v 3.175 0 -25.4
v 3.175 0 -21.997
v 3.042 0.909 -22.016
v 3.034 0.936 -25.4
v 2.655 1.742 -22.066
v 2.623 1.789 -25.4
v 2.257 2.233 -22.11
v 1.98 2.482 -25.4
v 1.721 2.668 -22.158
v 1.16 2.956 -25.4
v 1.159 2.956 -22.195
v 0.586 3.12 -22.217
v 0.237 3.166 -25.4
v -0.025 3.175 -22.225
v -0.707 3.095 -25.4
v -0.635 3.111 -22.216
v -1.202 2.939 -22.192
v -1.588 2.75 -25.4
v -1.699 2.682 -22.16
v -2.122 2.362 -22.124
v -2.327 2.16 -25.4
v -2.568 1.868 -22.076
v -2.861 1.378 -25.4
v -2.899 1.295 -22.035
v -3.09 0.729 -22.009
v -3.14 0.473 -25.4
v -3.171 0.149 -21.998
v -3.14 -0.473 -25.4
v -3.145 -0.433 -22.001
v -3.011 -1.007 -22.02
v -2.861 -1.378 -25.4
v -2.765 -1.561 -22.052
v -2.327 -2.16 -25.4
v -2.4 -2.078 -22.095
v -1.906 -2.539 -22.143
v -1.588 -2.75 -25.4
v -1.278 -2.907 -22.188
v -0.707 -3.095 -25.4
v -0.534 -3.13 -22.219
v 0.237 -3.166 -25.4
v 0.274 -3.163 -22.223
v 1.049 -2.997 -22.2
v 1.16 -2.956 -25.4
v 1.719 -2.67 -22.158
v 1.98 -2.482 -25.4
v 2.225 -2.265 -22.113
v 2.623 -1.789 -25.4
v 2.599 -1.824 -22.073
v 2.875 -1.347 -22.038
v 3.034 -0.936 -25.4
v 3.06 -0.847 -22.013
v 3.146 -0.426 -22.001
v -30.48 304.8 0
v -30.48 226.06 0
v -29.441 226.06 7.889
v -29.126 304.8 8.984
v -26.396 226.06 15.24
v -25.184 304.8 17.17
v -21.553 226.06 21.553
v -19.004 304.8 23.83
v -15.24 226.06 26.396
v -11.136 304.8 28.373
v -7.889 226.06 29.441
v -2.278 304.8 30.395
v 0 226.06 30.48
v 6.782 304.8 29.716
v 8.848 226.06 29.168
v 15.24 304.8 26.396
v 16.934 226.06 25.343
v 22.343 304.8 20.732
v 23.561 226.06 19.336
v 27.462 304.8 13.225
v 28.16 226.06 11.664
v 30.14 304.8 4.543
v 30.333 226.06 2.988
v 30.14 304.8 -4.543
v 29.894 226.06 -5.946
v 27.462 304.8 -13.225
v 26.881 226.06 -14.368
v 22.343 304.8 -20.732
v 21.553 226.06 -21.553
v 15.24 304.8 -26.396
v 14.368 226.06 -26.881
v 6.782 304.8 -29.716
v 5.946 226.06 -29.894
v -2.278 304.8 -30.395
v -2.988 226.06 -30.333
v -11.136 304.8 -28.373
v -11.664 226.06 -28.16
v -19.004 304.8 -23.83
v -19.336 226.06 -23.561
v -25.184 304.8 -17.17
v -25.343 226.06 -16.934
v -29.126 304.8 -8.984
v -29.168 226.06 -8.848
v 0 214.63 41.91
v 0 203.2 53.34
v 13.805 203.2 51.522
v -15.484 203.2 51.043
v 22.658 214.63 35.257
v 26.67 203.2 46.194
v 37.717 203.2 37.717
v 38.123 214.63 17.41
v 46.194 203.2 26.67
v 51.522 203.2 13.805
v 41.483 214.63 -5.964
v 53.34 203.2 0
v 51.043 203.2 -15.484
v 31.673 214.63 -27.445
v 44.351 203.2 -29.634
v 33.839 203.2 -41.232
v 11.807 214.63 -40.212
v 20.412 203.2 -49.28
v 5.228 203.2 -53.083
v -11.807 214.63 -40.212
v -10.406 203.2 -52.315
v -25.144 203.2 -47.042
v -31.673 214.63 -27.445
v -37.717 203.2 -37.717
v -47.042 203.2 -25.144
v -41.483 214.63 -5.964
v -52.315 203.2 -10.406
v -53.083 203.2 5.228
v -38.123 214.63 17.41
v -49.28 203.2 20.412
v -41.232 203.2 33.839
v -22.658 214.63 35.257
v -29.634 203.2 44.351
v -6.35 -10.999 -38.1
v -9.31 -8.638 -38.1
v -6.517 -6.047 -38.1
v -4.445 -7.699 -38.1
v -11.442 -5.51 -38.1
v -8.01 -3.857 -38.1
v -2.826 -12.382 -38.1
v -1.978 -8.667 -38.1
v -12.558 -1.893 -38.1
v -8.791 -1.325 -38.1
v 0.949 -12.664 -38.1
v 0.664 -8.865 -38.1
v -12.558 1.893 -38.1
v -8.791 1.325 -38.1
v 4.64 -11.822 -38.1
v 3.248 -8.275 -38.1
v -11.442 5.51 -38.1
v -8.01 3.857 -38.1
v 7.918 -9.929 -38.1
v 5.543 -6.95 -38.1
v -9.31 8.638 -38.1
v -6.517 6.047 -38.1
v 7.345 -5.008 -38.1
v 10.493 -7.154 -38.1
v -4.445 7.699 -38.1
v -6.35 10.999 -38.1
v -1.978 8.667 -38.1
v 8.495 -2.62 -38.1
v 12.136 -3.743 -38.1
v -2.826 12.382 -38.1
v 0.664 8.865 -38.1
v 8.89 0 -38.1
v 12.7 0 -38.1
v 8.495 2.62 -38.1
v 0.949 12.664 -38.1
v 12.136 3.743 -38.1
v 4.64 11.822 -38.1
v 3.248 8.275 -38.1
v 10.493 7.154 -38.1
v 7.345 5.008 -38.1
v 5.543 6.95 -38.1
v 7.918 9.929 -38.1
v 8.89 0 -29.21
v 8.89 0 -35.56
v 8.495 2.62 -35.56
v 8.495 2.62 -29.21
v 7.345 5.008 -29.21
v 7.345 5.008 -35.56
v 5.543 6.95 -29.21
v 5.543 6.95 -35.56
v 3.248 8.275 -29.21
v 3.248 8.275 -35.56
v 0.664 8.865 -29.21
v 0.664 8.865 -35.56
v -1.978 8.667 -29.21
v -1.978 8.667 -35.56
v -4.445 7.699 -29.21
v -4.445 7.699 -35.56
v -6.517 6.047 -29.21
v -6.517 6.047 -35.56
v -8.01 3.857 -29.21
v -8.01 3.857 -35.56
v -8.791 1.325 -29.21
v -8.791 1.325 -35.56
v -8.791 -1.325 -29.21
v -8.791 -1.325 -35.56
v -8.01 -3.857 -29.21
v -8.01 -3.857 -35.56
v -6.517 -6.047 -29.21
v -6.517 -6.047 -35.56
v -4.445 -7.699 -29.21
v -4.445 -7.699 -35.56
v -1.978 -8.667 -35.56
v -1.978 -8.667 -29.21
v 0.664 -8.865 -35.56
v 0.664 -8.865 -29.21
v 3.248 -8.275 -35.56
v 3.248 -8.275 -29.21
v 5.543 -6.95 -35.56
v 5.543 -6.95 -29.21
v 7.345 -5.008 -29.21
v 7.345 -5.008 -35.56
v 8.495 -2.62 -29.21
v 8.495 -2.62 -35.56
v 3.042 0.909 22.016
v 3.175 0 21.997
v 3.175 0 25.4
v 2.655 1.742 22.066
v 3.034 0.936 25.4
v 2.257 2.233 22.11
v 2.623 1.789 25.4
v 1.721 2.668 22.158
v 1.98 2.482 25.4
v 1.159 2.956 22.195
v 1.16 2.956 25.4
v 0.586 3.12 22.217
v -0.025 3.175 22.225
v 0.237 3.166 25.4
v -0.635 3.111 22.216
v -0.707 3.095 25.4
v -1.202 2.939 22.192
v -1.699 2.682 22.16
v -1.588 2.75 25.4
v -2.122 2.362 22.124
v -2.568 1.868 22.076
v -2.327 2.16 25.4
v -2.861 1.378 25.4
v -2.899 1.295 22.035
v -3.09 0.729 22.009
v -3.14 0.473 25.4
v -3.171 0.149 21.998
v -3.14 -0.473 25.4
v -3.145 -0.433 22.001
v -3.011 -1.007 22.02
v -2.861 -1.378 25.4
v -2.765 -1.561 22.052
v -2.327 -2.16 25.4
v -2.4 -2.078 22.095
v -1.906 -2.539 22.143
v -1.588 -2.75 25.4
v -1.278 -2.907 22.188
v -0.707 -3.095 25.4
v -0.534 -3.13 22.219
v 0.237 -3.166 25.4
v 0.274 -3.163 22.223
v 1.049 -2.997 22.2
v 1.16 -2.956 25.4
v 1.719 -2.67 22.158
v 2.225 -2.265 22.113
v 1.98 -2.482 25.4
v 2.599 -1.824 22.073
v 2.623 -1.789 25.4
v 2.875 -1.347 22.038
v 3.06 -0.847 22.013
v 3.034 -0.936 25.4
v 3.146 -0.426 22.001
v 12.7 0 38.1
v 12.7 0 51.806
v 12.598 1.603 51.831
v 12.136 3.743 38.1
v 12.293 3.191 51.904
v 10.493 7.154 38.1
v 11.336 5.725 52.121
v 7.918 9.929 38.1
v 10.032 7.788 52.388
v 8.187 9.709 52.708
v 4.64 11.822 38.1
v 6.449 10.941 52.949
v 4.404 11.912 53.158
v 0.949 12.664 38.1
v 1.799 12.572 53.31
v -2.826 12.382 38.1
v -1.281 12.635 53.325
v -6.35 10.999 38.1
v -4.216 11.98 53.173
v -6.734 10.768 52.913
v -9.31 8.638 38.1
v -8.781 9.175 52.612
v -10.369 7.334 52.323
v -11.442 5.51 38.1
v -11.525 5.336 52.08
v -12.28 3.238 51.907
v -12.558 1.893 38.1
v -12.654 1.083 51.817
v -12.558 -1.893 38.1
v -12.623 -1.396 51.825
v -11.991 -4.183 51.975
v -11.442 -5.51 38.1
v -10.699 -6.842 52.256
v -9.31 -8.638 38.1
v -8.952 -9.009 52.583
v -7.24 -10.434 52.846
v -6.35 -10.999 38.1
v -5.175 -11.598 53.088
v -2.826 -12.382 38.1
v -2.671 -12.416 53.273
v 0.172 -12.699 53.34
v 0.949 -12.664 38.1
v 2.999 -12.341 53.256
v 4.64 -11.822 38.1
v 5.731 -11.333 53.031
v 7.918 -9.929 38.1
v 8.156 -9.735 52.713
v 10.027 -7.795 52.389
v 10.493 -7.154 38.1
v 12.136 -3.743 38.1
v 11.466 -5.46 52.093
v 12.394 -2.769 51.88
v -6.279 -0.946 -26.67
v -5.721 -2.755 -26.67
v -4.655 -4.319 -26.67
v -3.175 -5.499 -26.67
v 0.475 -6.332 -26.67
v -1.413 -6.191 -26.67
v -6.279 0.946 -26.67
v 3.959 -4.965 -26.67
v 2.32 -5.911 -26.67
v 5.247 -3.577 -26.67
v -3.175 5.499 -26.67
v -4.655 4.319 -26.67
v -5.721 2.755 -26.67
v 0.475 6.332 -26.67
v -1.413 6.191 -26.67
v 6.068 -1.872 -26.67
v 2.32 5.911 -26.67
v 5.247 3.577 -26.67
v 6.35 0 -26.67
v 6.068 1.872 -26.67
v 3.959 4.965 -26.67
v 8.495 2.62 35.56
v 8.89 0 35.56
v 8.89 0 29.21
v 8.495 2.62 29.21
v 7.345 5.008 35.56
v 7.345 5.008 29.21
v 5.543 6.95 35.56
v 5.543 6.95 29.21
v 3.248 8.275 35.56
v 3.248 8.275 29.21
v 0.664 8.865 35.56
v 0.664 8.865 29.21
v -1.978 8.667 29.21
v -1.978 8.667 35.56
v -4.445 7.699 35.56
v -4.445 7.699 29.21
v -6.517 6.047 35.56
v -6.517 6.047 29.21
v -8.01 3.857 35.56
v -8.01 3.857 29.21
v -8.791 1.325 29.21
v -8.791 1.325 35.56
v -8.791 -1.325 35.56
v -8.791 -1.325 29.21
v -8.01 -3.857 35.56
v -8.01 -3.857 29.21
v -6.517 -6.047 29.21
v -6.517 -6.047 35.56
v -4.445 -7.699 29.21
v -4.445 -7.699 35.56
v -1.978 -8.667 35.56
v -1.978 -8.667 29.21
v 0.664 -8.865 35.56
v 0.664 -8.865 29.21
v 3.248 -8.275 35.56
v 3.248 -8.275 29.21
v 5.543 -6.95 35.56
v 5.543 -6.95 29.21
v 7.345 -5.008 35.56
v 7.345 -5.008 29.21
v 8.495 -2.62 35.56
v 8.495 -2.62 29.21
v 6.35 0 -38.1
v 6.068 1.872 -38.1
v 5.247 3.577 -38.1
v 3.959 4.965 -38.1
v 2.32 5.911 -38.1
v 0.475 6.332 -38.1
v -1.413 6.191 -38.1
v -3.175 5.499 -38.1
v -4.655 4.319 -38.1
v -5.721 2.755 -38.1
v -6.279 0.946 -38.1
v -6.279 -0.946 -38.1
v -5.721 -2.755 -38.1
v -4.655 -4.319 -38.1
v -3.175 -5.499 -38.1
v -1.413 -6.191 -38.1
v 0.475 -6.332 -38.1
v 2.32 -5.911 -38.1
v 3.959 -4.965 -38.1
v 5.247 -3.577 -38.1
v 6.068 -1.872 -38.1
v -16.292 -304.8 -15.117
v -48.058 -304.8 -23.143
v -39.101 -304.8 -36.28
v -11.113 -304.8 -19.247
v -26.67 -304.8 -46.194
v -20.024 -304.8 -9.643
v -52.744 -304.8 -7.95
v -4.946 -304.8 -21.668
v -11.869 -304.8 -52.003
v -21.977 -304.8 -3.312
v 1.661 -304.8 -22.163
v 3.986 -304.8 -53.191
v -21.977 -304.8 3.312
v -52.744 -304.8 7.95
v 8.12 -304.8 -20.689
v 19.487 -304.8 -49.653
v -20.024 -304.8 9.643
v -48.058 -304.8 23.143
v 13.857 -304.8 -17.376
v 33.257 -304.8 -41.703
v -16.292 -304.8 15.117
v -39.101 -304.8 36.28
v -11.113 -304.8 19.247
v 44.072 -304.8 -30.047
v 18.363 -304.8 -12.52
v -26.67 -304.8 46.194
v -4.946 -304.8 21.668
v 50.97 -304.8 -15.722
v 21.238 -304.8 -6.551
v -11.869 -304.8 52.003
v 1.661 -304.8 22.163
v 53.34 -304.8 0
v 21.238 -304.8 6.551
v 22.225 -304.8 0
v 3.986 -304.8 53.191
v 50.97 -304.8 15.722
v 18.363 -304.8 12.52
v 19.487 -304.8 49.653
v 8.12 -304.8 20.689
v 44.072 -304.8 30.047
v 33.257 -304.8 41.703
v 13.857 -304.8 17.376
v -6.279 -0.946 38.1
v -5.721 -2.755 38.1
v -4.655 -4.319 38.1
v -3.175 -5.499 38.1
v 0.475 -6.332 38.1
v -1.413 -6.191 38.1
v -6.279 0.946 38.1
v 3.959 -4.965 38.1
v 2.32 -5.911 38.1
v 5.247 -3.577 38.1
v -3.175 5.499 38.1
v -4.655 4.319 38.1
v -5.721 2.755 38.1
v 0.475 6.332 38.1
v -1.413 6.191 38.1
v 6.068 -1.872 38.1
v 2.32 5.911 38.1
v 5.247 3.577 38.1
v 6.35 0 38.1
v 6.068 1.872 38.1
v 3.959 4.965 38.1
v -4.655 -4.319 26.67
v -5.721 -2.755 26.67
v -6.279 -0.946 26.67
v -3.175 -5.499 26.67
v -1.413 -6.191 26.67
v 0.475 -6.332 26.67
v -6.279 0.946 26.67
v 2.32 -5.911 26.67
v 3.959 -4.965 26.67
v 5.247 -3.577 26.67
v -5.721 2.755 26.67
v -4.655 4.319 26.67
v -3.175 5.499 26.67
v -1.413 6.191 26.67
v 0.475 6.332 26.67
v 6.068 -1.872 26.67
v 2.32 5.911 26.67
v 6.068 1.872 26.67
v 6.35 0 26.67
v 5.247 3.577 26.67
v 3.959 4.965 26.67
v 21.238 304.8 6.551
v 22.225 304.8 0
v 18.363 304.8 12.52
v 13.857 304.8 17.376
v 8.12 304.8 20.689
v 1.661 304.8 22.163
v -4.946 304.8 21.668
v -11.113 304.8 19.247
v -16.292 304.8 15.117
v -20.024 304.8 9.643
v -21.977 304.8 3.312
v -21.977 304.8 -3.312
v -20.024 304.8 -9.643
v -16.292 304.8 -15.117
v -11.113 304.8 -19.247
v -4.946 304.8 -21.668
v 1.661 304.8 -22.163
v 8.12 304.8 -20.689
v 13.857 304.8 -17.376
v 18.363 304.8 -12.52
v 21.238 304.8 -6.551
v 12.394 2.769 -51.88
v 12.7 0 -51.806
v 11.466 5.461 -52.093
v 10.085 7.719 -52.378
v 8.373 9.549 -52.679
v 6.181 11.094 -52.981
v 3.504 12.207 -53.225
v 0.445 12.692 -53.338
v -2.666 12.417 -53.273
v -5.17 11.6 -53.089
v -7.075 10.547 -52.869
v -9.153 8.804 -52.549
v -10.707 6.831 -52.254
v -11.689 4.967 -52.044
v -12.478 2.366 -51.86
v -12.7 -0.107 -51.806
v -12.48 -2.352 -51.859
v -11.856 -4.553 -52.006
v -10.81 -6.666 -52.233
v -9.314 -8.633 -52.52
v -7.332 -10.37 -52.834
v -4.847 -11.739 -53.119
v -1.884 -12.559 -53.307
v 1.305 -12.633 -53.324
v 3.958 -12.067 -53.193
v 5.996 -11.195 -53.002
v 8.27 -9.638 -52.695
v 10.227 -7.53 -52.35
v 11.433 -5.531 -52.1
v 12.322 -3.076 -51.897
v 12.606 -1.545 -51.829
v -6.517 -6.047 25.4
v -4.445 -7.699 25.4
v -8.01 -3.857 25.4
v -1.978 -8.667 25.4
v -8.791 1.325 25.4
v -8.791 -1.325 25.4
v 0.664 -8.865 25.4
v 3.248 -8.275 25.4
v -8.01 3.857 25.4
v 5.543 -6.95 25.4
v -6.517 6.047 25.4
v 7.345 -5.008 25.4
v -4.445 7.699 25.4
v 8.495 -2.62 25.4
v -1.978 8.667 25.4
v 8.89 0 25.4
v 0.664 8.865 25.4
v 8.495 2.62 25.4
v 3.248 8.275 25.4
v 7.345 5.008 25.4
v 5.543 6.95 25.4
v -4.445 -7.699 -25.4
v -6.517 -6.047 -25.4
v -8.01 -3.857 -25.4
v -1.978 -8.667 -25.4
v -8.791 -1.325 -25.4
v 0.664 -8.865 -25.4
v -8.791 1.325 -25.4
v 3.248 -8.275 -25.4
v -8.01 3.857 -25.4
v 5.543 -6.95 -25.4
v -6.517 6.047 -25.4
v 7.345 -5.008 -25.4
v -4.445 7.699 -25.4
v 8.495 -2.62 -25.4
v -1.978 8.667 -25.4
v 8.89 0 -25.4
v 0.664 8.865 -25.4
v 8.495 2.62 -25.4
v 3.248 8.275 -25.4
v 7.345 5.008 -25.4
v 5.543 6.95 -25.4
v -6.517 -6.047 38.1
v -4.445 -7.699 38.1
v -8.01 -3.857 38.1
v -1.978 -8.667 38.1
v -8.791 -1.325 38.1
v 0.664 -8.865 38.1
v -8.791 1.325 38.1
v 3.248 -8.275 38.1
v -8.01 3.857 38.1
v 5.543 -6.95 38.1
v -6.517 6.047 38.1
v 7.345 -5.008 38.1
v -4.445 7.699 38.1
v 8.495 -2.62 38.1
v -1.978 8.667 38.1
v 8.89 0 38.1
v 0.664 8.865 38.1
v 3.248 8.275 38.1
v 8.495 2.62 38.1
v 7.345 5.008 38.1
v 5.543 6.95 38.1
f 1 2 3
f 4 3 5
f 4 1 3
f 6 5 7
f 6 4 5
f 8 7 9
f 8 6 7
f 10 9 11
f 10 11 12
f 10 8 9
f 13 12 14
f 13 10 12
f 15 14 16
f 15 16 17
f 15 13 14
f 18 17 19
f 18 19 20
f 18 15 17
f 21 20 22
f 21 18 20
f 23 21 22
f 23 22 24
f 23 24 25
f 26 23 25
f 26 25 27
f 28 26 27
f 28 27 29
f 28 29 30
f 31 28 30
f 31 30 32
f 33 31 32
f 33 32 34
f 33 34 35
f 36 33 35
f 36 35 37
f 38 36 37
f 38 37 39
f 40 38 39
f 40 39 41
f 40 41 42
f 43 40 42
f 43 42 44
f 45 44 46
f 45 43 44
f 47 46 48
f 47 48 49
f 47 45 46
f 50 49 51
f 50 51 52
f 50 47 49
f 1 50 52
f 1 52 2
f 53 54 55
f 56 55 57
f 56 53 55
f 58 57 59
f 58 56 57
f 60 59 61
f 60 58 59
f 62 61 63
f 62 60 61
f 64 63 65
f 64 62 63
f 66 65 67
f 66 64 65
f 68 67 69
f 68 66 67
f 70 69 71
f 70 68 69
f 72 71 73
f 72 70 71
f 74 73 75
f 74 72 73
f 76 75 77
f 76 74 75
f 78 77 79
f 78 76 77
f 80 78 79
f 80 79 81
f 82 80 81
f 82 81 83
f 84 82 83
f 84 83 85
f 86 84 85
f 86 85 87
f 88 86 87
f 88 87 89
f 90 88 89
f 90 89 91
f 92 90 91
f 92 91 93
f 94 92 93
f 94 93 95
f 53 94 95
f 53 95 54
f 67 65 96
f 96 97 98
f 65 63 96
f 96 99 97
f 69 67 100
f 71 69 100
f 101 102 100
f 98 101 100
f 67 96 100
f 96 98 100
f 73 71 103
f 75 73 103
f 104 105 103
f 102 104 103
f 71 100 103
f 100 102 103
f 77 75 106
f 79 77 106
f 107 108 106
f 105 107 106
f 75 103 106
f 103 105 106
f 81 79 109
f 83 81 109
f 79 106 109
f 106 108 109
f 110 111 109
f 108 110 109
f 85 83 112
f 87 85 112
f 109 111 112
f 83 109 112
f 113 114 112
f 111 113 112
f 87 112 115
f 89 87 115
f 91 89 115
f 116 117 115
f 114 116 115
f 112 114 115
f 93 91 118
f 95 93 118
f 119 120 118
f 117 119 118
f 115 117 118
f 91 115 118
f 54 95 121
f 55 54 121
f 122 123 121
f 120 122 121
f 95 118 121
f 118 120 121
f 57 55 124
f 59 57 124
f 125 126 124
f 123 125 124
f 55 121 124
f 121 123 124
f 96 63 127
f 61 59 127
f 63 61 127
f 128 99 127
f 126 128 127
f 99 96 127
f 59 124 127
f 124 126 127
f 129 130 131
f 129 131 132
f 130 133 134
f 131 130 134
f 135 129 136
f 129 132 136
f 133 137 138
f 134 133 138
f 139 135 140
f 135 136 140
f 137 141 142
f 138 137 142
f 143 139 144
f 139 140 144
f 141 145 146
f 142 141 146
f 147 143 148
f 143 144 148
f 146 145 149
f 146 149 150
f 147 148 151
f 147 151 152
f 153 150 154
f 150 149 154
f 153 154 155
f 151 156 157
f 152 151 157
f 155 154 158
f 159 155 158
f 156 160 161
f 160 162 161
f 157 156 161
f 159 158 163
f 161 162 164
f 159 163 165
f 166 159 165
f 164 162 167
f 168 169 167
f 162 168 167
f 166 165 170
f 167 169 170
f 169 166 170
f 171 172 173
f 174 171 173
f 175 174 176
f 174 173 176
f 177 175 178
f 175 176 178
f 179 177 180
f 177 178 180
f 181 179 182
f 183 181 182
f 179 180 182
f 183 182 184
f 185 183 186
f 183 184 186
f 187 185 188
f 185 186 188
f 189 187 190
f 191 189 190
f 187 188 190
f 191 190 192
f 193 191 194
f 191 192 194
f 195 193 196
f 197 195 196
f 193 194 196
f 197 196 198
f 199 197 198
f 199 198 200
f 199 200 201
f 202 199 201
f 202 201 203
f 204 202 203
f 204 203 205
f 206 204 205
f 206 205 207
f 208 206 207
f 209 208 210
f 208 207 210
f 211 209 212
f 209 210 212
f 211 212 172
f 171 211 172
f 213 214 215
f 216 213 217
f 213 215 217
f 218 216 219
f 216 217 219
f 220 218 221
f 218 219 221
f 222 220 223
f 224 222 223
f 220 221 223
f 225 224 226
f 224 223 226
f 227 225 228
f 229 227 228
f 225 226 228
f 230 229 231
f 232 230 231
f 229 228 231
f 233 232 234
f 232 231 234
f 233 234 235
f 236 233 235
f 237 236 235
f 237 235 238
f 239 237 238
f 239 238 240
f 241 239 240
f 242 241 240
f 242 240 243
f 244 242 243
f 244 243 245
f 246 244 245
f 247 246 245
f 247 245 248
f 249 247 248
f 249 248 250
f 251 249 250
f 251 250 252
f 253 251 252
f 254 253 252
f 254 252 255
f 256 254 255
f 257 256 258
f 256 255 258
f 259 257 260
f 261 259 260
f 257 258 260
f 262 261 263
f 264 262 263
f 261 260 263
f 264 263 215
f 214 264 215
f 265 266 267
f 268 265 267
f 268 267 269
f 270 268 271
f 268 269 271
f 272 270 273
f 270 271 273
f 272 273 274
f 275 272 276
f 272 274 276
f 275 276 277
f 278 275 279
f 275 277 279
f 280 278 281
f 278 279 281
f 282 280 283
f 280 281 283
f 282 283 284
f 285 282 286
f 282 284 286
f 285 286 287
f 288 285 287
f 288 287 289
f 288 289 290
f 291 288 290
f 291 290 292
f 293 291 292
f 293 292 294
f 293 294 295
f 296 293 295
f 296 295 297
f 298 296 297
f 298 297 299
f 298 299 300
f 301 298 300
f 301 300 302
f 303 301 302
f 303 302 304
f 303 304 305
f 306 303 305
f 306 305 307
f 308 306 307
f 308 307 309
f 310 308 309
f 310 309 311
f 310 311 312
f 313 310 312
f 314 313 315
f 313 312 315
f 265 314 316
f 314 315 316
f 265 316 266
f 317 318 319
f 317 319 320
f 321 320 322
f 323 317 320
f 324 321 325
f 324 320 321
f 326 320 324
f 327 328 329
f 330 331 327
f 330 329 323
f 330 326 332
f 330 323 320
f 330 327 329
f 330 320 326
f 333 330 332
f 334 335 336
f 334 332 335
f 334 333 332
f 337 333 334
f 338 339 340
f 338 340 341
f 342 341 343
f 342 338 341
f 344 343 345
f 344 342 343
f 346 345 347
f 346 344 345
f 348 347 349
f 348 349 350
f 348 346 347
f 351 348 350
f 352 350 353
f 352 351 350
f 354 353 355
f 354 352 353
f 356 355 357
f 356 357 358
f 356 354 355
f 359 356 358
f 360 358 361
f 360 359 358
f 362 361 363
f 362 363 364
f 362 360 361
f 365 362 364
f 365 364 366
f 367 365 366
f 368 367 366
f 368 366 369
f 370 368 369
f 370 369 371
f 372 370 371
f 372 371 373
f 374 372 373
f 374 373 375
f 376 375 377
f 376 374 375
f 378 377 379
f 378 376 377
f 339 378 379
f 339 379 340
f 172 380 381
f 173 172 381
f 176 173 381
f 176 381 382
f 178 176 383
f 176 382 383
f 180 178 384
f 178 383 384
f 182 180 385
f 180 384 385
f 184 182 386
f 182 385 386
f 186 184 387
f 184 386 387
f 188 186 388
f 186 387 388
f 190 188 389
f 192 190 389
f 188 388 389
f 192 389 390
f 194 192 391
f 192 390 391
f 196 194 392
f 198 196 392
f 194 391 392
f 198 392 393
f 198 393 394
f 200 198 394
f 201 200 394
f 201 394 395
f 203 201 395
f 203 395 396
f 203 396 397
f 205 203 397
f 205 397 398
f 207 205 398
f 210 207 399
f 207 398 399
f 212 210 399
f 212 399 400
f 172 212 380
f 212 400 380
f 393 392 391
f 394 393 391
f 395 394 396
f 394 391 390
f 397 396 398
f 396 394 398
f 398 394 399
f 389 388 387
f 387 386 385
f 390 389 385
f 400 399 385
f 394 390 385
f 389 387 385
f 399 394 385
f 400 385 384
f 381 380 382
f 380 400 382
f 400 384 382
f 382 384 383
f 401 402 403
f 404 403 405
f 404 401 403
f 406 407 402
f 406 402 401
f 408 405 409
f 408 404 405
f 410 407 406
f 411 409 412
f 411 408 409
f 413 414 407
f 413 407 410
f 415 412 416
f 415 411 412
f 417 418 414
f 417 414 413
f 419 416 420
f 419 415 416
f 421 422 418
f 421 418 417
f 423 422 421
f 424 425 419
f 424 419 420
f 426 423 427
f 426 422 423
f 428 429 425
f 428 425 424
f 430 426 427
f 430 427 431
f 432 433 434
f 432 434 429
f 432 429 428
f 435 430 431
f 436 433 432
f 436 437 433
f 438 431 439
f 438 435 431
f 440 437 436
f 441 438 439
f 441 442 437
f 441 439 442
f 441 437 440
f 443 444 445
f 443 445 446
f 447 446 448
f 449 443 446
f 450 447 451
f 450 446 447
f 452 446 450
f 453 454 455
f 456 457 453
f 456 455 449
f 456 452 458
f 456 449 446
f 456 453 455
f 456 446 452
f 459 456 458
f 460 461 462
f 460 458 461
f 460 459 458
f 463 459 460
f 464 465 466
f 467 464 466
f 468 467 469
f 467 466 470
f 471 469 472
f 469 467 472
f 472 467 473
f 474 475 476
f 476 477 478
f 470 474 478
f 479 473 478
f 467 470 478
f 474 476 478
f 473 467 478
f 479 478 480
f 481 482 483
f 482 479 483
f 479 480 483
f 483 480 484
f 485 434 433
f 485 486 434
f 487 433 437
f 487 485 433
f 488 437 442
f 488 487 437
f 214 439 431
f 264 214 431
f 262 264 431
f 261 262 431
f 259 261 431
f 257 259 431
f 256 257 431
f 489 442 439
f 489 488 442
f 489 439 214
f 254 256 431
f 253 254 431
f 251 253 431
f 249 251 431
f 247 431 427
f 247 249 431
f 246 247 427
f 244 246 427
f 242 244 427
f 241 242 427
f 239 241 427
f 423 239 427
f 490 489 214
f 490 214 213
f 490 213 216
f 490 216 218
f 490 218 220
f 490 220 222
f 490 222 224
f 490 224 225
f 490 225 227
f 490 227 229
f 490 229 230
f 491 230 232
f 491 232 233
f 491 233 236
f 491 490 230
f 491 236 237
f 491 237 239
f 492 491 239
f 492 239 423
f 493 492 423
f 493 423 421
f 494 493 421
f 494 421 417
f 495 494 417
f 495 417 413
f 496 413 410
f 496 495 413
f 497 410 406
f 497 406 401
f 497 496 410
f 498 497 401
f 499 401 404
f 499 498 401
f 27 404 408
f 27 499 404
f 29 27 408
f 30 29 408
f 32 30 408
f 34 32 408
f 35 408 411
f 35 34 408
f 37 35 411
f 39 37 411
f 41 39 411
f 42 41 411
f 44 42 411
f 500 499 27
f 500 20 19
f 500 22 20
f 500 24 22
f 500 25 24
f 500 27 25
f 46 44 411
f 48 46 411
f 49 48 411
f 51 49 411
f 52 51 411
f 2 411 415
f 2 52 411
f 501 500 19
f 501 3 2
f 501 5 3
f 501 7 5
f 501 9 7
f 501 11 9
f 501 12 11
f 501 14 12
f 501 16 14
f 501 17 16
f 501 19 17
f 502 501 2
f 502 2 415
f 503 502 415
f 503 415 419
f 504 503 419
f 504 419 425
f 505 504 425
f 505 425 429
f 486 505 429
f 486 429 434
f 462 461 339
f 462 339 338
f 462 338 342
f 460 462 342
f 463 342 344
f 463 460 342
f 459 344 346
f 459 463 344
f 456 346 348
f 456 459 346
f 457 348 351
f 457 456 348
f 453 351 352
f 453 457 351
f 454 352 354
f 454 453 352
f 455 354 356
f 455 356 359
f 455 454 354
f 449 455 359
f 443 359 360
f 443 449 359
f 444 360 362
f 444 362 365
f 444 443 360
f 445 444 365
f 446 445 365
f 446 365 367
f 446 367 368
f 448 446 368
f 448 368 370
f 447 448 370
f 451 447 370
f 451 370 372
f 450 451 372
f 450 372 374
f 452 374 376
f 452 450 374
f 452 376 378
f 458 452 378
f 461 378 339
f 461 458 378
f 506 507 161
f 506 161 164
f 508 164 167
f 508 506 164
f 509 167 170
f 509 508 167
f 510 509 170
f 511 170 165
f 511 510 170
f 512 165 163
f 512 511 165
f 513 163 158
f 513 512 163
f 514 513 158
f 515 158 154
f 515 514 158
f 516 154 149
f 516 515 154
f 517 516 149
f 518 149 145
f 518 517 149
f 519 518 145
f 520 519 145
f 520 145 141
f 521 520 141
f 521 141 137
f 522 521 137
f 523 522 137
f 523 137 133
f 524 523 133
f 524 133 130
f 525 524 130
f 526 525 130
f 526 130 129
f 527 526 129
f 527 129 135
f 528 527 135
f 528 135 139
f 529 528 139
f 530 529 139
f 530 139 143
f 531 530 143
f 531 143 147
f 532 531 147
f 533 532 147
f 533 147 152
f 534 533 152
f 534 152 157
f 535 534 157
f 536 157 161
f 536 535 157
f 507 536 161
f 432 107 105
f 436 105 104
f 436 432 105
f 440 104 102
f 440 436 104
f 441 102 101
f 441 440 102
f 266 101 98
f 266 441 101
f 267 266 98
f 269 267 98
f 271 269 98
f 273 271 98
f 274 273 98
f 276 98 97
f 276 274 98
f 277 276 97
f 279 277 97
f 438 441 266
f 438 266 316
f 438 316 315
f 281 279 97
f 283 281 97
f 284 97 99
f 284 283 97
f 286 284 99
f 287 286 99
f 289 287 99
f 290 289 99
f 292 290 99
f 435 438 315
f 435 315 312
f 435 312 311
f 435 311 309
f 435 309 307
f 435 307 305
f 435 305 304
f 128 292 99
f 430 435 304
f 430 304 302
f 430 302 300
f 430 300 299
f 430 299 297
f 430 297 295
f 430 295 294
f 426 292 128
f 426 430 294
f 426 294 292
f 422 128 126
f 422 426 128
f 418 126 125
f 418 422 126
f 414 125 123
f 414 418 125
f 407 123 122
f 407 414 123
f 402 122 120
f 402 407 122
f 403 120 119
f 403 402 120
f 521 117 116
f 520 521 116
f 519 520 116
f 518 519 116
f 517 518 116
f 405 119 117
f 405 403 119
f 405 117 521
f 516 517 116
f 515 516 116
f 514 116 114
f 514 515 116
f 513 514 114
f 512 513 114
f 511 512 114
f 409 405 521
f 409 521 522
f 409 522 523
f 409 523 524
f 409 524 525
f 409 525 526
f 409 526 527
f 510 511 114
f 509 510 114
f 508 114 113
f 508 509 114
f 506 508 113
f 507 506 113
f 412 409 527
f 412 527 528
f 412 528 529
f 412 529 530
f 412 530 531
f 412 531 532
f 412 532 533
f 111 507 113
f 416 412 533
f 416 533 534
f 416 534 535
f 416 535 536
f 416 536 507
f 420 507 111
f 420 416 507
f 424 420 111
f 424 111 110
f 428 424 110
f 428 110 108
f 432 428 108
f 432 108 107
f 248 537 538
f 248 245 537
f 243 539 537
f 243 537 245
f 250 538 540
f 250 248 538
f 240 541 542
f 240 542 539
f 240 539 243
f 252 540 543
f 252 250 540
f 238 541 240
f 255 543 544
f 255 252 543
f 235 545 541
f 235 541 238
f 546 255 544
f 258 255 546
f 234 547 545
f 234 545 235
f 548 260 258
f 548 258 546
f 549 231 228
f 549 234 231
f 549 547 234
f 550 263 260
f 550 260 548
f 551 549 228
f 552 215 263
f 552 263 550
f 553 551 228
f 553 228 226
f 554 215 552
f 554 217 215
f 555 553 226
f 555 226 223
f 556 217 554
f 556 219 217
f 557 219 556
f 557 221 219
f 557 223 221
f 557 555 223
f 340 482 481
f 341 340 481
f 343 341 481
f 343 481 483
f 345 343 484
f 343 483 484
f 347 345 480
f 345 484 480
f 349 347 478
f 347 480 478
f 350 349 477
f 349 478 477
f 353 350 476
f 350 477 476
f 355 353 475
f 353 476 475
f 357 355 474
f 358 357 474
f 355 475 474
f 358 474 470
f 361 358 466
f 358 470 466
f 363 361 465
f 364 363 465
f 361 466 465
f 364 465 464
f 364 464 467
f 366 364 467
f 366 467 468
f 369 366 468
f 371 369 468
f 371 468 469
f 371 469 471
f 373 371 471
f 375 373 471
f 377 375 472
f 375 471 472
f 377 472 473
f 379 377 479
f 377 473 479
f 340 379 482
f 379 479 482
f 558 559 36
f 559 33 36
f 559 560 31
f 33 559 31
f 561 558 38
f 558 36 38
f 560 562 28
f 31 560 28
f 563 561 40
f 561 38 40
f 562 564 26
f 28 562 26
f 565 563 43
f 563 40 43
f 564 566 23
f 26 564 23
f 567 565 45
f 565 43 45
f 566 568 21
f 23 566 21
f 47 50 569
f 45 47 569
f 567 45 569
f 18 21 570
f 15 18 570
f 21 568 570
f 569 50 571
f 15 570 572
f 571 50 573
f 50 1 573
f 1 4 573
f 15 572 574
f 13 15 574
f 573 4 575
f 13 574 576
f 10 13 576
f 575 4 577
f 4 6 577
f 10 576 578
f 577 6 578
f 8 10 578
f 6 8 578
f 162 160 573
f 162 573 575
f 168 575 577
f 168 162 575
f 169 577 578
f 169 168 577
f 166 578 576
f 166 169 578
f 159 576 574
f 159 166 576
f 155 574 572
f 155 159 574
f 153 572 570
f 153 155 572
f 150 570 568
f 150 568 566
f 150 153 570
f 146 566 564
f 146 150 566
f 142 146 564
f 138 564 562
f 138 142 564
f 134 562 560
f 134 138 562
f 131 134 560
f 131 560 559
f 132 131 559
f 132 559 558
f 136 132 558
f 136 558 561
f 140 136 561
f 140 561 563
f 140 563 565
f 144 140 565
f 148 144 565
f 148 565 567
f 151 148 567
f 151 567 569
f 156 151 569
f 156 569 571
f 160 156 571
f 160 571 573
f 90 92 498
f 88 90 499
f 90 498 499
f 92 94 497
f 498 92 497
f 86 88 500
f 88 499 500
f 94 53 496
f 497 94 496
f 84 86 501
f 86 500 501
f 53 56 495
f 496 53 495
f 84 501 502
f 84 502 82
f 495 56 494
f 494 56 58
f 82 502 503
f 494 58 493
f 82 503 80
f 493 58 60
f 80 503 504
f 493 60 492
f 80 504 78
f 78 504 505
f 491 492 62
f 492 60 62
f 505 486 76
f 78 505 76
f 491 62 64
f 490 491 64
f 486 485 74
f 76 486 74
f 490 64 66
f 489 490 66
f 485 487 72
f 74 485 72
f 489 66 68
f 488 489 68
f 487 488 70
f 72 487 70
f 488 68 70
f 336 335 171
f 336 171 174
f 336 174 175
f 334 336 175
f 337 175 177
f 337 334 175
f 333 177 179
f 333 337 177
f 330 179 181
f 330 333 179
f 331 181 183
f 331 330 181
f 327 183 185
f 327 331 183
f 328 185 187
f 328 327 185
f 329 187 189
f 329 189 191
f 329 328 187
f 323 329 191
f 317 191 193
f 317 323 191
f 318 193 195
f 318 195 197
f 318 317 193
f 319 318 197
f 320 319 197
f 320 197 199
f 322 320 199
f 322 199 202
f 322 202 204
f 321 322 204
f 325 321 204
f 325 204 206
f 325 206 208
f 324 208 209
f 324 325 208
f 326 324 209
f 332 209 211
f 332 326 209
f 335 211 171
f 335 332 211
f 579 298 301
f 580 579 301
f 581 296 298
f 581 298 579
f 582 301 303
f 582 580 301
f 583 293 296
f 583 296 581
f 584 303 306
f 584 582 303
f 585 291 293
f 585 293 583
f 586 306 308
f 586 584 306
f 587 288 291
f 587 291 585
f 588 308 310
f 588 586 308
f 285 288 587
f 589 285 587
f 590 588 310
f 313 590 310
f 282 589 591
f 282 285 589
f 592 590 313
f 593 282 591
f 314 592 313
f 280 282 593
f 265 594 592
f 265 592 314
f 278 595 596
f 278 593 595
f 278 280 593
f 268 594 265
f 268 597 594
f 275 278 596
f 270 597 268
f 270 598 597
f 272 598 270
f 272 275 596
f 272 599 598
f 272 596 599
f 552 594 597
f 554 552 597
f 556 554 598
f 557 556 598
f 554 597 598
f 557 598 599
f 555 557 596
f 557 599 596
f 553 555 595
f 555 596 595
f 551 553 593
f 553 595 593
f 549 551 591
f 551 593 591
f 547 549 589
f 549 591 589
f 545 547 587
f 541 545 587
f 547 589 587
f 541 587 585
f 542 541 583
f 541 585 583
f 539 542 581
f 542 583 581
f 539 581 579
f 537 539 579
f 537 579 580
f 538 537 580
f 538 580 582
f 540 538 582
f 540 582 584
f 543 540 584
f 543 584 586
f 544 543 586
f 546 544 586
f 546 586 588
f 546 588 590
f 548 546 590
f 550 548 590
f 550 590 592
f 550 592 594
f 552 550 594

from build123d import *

# Parameters (mm, degrees)
F0_R      = 53.34
F0_R_2    = 22.225
F1_DEPTH  = 304.8
F4_R      = 53.34
F4_R_2    = 30.48
F5_DEPTH  = 101.6
F10_R     = 12.7
F10_R_2   = 8.89
F10_R_3   = 3.175
F11_DEPTH = 15.24
F12_DEPTH = 27.94
F13_DEPTH = 32.3429548439
F14_R     = 12.7
F14_R_2   = 8.89
F14_R_3   = 3.175
F15_DEPTH = 15.24
F16_DEPTH = 27.94
F17_DEPTH = 32.3429548439
F20_R     = 8.89
F21_DEPTH = 11.43
F22_SIZE  = 2.54
F23_R     = 8.89
F24_DEPTH = 11.43
F25_SIZE  = 2.54


with BuildPart() as f1:
    # F0 (on Front) → F1 (new body, symmetric)
    with BuildSketch(Plane.XZ):
        Circle(F0_R)
        Circle(F0_R_2, mode=Mode.SUBTRACT)
    extrude(amount=F1_DEPTH, both=True)

    # F4 (on offset) → F5 (cut)
    with BuildSketch(Plane(origin=(0, 304.8, 0), x_dir=(-1, 0, 0), z_dir=(0, 1, 0))):
        Circle(F4_R)
        Circle(F4_R_2, mode=Mode.SUBTRACT)
    extrude(amount=-F5_DEPTH, mode=Mode.SUBTRACT)

    # F6 (on Right) → F7 (revolve)
    with BuildSketch(Plane.YZ):
        Polygon((203.2, 53.34), (203.2, 30.48), (226.06, 30.48), align=None)
    revolve(axis=Axis((0, 101.6, 0), (0, 1, 0)))

    # F10 (on offset) → F11 (cut)
    with BuildSketch(Plane.XY.offset(53.34)):
        Circle(F10_R)
        Circle(F10_R_2, mode=Mode.SUBTRACT)
        Circle(F10_R_2)
        Circle(F10_R_3, mode=Mode.SUBTRACT)
        Circle(F10_R_3)
    extrude(amount=-F11_DEPTH, mode=Mode.SUBTRACT)

    # F10 (on offset) → F12 (cut)
    with BuildSketch(Plane.XY.offset(53.34)):
        Circle(F10_R_2)
        Circle(F10_R_3, mode=Mode.SUBTRACT)
        Circle(F10_R_3)
    extrude(amount=-F12_DEPTH, mode=Mode.SUBTRACT)

    # F10 (on offset) → F13 (cut, up to face)
    with BuildSketch(Plane.XY.offset(53.34)):
        Circle(F10_R_3)
    extrude(amount=-F13_DEPTH, mode=Mode.SUBTRACT)

    # F14 (on offset) → F15 (cut)
    with BuildSketch(Plane.XY.offset(-53.34)):
        Circle(F14_R)
        Circle(F14_R_2, mode=Mode.SUBTRACT)
        Circle(F14_R_2)
        Circle(F14_R_3, mode=Mode.SUBTRACT)
        Circle(F14_R_3)
    extrude(amount=F15_DEPTH, mode=Mode.SUBTRACT)

    # F14 (on offset) → F16 (cut)
    with BuildSketch(Plane.XY.offset(-53.34)):
        Circle(F14_R_2)
        Circle(F14_R_3, mode=Mode.SUBTRACT)
        Circle(F14_R_3)
    extrude(amount=F16_DEPTH, mode=Mode.SUBTRACT)

    # F14 (on offset) → F17 (cut, up to face)
    with BuildSketch(Plane.XY.offset(-53.34)):
        Circle(F14_R_3)
    extrude(amount=F17_DEPTH, mode=Mode.SUBTRACT)


with BuildPart() as f21:
    # F20 (on offset) → F21 (new body)
    with BuildSketch(Plane.XY.offset(38.1)):
        Circle(F20_R)
    extrude(amount=-F21_DEPTH)

    # F22
    f22_edges = [f21.edges().sort_by_distance(p)[0] for p in [
        (-8.89, 0, 38.1),
        (-8.89, 0, 26.67),
    ]]
    chamfer(f22_edges, length=F22_SIZE)


with BuildPart() as f24:
    # F23 (on offset) → F24 (new body)
    with BuildSketch(Plane.XY.offset(-38.1)):
        Circle(F23_R)
    extrude(amount=F24_DEPTH)

    # F25
    f25_edges = [f24.edges().sort_by_distance(p)[0] for p in [
        (-8.89, 0, -38.1),
        (-8.89, 0, -26.67),
    ]]
    chamfer(f25_edges, length=F25_SIZE)


solid = Compound([f1.part, f21.part, f24.part])
